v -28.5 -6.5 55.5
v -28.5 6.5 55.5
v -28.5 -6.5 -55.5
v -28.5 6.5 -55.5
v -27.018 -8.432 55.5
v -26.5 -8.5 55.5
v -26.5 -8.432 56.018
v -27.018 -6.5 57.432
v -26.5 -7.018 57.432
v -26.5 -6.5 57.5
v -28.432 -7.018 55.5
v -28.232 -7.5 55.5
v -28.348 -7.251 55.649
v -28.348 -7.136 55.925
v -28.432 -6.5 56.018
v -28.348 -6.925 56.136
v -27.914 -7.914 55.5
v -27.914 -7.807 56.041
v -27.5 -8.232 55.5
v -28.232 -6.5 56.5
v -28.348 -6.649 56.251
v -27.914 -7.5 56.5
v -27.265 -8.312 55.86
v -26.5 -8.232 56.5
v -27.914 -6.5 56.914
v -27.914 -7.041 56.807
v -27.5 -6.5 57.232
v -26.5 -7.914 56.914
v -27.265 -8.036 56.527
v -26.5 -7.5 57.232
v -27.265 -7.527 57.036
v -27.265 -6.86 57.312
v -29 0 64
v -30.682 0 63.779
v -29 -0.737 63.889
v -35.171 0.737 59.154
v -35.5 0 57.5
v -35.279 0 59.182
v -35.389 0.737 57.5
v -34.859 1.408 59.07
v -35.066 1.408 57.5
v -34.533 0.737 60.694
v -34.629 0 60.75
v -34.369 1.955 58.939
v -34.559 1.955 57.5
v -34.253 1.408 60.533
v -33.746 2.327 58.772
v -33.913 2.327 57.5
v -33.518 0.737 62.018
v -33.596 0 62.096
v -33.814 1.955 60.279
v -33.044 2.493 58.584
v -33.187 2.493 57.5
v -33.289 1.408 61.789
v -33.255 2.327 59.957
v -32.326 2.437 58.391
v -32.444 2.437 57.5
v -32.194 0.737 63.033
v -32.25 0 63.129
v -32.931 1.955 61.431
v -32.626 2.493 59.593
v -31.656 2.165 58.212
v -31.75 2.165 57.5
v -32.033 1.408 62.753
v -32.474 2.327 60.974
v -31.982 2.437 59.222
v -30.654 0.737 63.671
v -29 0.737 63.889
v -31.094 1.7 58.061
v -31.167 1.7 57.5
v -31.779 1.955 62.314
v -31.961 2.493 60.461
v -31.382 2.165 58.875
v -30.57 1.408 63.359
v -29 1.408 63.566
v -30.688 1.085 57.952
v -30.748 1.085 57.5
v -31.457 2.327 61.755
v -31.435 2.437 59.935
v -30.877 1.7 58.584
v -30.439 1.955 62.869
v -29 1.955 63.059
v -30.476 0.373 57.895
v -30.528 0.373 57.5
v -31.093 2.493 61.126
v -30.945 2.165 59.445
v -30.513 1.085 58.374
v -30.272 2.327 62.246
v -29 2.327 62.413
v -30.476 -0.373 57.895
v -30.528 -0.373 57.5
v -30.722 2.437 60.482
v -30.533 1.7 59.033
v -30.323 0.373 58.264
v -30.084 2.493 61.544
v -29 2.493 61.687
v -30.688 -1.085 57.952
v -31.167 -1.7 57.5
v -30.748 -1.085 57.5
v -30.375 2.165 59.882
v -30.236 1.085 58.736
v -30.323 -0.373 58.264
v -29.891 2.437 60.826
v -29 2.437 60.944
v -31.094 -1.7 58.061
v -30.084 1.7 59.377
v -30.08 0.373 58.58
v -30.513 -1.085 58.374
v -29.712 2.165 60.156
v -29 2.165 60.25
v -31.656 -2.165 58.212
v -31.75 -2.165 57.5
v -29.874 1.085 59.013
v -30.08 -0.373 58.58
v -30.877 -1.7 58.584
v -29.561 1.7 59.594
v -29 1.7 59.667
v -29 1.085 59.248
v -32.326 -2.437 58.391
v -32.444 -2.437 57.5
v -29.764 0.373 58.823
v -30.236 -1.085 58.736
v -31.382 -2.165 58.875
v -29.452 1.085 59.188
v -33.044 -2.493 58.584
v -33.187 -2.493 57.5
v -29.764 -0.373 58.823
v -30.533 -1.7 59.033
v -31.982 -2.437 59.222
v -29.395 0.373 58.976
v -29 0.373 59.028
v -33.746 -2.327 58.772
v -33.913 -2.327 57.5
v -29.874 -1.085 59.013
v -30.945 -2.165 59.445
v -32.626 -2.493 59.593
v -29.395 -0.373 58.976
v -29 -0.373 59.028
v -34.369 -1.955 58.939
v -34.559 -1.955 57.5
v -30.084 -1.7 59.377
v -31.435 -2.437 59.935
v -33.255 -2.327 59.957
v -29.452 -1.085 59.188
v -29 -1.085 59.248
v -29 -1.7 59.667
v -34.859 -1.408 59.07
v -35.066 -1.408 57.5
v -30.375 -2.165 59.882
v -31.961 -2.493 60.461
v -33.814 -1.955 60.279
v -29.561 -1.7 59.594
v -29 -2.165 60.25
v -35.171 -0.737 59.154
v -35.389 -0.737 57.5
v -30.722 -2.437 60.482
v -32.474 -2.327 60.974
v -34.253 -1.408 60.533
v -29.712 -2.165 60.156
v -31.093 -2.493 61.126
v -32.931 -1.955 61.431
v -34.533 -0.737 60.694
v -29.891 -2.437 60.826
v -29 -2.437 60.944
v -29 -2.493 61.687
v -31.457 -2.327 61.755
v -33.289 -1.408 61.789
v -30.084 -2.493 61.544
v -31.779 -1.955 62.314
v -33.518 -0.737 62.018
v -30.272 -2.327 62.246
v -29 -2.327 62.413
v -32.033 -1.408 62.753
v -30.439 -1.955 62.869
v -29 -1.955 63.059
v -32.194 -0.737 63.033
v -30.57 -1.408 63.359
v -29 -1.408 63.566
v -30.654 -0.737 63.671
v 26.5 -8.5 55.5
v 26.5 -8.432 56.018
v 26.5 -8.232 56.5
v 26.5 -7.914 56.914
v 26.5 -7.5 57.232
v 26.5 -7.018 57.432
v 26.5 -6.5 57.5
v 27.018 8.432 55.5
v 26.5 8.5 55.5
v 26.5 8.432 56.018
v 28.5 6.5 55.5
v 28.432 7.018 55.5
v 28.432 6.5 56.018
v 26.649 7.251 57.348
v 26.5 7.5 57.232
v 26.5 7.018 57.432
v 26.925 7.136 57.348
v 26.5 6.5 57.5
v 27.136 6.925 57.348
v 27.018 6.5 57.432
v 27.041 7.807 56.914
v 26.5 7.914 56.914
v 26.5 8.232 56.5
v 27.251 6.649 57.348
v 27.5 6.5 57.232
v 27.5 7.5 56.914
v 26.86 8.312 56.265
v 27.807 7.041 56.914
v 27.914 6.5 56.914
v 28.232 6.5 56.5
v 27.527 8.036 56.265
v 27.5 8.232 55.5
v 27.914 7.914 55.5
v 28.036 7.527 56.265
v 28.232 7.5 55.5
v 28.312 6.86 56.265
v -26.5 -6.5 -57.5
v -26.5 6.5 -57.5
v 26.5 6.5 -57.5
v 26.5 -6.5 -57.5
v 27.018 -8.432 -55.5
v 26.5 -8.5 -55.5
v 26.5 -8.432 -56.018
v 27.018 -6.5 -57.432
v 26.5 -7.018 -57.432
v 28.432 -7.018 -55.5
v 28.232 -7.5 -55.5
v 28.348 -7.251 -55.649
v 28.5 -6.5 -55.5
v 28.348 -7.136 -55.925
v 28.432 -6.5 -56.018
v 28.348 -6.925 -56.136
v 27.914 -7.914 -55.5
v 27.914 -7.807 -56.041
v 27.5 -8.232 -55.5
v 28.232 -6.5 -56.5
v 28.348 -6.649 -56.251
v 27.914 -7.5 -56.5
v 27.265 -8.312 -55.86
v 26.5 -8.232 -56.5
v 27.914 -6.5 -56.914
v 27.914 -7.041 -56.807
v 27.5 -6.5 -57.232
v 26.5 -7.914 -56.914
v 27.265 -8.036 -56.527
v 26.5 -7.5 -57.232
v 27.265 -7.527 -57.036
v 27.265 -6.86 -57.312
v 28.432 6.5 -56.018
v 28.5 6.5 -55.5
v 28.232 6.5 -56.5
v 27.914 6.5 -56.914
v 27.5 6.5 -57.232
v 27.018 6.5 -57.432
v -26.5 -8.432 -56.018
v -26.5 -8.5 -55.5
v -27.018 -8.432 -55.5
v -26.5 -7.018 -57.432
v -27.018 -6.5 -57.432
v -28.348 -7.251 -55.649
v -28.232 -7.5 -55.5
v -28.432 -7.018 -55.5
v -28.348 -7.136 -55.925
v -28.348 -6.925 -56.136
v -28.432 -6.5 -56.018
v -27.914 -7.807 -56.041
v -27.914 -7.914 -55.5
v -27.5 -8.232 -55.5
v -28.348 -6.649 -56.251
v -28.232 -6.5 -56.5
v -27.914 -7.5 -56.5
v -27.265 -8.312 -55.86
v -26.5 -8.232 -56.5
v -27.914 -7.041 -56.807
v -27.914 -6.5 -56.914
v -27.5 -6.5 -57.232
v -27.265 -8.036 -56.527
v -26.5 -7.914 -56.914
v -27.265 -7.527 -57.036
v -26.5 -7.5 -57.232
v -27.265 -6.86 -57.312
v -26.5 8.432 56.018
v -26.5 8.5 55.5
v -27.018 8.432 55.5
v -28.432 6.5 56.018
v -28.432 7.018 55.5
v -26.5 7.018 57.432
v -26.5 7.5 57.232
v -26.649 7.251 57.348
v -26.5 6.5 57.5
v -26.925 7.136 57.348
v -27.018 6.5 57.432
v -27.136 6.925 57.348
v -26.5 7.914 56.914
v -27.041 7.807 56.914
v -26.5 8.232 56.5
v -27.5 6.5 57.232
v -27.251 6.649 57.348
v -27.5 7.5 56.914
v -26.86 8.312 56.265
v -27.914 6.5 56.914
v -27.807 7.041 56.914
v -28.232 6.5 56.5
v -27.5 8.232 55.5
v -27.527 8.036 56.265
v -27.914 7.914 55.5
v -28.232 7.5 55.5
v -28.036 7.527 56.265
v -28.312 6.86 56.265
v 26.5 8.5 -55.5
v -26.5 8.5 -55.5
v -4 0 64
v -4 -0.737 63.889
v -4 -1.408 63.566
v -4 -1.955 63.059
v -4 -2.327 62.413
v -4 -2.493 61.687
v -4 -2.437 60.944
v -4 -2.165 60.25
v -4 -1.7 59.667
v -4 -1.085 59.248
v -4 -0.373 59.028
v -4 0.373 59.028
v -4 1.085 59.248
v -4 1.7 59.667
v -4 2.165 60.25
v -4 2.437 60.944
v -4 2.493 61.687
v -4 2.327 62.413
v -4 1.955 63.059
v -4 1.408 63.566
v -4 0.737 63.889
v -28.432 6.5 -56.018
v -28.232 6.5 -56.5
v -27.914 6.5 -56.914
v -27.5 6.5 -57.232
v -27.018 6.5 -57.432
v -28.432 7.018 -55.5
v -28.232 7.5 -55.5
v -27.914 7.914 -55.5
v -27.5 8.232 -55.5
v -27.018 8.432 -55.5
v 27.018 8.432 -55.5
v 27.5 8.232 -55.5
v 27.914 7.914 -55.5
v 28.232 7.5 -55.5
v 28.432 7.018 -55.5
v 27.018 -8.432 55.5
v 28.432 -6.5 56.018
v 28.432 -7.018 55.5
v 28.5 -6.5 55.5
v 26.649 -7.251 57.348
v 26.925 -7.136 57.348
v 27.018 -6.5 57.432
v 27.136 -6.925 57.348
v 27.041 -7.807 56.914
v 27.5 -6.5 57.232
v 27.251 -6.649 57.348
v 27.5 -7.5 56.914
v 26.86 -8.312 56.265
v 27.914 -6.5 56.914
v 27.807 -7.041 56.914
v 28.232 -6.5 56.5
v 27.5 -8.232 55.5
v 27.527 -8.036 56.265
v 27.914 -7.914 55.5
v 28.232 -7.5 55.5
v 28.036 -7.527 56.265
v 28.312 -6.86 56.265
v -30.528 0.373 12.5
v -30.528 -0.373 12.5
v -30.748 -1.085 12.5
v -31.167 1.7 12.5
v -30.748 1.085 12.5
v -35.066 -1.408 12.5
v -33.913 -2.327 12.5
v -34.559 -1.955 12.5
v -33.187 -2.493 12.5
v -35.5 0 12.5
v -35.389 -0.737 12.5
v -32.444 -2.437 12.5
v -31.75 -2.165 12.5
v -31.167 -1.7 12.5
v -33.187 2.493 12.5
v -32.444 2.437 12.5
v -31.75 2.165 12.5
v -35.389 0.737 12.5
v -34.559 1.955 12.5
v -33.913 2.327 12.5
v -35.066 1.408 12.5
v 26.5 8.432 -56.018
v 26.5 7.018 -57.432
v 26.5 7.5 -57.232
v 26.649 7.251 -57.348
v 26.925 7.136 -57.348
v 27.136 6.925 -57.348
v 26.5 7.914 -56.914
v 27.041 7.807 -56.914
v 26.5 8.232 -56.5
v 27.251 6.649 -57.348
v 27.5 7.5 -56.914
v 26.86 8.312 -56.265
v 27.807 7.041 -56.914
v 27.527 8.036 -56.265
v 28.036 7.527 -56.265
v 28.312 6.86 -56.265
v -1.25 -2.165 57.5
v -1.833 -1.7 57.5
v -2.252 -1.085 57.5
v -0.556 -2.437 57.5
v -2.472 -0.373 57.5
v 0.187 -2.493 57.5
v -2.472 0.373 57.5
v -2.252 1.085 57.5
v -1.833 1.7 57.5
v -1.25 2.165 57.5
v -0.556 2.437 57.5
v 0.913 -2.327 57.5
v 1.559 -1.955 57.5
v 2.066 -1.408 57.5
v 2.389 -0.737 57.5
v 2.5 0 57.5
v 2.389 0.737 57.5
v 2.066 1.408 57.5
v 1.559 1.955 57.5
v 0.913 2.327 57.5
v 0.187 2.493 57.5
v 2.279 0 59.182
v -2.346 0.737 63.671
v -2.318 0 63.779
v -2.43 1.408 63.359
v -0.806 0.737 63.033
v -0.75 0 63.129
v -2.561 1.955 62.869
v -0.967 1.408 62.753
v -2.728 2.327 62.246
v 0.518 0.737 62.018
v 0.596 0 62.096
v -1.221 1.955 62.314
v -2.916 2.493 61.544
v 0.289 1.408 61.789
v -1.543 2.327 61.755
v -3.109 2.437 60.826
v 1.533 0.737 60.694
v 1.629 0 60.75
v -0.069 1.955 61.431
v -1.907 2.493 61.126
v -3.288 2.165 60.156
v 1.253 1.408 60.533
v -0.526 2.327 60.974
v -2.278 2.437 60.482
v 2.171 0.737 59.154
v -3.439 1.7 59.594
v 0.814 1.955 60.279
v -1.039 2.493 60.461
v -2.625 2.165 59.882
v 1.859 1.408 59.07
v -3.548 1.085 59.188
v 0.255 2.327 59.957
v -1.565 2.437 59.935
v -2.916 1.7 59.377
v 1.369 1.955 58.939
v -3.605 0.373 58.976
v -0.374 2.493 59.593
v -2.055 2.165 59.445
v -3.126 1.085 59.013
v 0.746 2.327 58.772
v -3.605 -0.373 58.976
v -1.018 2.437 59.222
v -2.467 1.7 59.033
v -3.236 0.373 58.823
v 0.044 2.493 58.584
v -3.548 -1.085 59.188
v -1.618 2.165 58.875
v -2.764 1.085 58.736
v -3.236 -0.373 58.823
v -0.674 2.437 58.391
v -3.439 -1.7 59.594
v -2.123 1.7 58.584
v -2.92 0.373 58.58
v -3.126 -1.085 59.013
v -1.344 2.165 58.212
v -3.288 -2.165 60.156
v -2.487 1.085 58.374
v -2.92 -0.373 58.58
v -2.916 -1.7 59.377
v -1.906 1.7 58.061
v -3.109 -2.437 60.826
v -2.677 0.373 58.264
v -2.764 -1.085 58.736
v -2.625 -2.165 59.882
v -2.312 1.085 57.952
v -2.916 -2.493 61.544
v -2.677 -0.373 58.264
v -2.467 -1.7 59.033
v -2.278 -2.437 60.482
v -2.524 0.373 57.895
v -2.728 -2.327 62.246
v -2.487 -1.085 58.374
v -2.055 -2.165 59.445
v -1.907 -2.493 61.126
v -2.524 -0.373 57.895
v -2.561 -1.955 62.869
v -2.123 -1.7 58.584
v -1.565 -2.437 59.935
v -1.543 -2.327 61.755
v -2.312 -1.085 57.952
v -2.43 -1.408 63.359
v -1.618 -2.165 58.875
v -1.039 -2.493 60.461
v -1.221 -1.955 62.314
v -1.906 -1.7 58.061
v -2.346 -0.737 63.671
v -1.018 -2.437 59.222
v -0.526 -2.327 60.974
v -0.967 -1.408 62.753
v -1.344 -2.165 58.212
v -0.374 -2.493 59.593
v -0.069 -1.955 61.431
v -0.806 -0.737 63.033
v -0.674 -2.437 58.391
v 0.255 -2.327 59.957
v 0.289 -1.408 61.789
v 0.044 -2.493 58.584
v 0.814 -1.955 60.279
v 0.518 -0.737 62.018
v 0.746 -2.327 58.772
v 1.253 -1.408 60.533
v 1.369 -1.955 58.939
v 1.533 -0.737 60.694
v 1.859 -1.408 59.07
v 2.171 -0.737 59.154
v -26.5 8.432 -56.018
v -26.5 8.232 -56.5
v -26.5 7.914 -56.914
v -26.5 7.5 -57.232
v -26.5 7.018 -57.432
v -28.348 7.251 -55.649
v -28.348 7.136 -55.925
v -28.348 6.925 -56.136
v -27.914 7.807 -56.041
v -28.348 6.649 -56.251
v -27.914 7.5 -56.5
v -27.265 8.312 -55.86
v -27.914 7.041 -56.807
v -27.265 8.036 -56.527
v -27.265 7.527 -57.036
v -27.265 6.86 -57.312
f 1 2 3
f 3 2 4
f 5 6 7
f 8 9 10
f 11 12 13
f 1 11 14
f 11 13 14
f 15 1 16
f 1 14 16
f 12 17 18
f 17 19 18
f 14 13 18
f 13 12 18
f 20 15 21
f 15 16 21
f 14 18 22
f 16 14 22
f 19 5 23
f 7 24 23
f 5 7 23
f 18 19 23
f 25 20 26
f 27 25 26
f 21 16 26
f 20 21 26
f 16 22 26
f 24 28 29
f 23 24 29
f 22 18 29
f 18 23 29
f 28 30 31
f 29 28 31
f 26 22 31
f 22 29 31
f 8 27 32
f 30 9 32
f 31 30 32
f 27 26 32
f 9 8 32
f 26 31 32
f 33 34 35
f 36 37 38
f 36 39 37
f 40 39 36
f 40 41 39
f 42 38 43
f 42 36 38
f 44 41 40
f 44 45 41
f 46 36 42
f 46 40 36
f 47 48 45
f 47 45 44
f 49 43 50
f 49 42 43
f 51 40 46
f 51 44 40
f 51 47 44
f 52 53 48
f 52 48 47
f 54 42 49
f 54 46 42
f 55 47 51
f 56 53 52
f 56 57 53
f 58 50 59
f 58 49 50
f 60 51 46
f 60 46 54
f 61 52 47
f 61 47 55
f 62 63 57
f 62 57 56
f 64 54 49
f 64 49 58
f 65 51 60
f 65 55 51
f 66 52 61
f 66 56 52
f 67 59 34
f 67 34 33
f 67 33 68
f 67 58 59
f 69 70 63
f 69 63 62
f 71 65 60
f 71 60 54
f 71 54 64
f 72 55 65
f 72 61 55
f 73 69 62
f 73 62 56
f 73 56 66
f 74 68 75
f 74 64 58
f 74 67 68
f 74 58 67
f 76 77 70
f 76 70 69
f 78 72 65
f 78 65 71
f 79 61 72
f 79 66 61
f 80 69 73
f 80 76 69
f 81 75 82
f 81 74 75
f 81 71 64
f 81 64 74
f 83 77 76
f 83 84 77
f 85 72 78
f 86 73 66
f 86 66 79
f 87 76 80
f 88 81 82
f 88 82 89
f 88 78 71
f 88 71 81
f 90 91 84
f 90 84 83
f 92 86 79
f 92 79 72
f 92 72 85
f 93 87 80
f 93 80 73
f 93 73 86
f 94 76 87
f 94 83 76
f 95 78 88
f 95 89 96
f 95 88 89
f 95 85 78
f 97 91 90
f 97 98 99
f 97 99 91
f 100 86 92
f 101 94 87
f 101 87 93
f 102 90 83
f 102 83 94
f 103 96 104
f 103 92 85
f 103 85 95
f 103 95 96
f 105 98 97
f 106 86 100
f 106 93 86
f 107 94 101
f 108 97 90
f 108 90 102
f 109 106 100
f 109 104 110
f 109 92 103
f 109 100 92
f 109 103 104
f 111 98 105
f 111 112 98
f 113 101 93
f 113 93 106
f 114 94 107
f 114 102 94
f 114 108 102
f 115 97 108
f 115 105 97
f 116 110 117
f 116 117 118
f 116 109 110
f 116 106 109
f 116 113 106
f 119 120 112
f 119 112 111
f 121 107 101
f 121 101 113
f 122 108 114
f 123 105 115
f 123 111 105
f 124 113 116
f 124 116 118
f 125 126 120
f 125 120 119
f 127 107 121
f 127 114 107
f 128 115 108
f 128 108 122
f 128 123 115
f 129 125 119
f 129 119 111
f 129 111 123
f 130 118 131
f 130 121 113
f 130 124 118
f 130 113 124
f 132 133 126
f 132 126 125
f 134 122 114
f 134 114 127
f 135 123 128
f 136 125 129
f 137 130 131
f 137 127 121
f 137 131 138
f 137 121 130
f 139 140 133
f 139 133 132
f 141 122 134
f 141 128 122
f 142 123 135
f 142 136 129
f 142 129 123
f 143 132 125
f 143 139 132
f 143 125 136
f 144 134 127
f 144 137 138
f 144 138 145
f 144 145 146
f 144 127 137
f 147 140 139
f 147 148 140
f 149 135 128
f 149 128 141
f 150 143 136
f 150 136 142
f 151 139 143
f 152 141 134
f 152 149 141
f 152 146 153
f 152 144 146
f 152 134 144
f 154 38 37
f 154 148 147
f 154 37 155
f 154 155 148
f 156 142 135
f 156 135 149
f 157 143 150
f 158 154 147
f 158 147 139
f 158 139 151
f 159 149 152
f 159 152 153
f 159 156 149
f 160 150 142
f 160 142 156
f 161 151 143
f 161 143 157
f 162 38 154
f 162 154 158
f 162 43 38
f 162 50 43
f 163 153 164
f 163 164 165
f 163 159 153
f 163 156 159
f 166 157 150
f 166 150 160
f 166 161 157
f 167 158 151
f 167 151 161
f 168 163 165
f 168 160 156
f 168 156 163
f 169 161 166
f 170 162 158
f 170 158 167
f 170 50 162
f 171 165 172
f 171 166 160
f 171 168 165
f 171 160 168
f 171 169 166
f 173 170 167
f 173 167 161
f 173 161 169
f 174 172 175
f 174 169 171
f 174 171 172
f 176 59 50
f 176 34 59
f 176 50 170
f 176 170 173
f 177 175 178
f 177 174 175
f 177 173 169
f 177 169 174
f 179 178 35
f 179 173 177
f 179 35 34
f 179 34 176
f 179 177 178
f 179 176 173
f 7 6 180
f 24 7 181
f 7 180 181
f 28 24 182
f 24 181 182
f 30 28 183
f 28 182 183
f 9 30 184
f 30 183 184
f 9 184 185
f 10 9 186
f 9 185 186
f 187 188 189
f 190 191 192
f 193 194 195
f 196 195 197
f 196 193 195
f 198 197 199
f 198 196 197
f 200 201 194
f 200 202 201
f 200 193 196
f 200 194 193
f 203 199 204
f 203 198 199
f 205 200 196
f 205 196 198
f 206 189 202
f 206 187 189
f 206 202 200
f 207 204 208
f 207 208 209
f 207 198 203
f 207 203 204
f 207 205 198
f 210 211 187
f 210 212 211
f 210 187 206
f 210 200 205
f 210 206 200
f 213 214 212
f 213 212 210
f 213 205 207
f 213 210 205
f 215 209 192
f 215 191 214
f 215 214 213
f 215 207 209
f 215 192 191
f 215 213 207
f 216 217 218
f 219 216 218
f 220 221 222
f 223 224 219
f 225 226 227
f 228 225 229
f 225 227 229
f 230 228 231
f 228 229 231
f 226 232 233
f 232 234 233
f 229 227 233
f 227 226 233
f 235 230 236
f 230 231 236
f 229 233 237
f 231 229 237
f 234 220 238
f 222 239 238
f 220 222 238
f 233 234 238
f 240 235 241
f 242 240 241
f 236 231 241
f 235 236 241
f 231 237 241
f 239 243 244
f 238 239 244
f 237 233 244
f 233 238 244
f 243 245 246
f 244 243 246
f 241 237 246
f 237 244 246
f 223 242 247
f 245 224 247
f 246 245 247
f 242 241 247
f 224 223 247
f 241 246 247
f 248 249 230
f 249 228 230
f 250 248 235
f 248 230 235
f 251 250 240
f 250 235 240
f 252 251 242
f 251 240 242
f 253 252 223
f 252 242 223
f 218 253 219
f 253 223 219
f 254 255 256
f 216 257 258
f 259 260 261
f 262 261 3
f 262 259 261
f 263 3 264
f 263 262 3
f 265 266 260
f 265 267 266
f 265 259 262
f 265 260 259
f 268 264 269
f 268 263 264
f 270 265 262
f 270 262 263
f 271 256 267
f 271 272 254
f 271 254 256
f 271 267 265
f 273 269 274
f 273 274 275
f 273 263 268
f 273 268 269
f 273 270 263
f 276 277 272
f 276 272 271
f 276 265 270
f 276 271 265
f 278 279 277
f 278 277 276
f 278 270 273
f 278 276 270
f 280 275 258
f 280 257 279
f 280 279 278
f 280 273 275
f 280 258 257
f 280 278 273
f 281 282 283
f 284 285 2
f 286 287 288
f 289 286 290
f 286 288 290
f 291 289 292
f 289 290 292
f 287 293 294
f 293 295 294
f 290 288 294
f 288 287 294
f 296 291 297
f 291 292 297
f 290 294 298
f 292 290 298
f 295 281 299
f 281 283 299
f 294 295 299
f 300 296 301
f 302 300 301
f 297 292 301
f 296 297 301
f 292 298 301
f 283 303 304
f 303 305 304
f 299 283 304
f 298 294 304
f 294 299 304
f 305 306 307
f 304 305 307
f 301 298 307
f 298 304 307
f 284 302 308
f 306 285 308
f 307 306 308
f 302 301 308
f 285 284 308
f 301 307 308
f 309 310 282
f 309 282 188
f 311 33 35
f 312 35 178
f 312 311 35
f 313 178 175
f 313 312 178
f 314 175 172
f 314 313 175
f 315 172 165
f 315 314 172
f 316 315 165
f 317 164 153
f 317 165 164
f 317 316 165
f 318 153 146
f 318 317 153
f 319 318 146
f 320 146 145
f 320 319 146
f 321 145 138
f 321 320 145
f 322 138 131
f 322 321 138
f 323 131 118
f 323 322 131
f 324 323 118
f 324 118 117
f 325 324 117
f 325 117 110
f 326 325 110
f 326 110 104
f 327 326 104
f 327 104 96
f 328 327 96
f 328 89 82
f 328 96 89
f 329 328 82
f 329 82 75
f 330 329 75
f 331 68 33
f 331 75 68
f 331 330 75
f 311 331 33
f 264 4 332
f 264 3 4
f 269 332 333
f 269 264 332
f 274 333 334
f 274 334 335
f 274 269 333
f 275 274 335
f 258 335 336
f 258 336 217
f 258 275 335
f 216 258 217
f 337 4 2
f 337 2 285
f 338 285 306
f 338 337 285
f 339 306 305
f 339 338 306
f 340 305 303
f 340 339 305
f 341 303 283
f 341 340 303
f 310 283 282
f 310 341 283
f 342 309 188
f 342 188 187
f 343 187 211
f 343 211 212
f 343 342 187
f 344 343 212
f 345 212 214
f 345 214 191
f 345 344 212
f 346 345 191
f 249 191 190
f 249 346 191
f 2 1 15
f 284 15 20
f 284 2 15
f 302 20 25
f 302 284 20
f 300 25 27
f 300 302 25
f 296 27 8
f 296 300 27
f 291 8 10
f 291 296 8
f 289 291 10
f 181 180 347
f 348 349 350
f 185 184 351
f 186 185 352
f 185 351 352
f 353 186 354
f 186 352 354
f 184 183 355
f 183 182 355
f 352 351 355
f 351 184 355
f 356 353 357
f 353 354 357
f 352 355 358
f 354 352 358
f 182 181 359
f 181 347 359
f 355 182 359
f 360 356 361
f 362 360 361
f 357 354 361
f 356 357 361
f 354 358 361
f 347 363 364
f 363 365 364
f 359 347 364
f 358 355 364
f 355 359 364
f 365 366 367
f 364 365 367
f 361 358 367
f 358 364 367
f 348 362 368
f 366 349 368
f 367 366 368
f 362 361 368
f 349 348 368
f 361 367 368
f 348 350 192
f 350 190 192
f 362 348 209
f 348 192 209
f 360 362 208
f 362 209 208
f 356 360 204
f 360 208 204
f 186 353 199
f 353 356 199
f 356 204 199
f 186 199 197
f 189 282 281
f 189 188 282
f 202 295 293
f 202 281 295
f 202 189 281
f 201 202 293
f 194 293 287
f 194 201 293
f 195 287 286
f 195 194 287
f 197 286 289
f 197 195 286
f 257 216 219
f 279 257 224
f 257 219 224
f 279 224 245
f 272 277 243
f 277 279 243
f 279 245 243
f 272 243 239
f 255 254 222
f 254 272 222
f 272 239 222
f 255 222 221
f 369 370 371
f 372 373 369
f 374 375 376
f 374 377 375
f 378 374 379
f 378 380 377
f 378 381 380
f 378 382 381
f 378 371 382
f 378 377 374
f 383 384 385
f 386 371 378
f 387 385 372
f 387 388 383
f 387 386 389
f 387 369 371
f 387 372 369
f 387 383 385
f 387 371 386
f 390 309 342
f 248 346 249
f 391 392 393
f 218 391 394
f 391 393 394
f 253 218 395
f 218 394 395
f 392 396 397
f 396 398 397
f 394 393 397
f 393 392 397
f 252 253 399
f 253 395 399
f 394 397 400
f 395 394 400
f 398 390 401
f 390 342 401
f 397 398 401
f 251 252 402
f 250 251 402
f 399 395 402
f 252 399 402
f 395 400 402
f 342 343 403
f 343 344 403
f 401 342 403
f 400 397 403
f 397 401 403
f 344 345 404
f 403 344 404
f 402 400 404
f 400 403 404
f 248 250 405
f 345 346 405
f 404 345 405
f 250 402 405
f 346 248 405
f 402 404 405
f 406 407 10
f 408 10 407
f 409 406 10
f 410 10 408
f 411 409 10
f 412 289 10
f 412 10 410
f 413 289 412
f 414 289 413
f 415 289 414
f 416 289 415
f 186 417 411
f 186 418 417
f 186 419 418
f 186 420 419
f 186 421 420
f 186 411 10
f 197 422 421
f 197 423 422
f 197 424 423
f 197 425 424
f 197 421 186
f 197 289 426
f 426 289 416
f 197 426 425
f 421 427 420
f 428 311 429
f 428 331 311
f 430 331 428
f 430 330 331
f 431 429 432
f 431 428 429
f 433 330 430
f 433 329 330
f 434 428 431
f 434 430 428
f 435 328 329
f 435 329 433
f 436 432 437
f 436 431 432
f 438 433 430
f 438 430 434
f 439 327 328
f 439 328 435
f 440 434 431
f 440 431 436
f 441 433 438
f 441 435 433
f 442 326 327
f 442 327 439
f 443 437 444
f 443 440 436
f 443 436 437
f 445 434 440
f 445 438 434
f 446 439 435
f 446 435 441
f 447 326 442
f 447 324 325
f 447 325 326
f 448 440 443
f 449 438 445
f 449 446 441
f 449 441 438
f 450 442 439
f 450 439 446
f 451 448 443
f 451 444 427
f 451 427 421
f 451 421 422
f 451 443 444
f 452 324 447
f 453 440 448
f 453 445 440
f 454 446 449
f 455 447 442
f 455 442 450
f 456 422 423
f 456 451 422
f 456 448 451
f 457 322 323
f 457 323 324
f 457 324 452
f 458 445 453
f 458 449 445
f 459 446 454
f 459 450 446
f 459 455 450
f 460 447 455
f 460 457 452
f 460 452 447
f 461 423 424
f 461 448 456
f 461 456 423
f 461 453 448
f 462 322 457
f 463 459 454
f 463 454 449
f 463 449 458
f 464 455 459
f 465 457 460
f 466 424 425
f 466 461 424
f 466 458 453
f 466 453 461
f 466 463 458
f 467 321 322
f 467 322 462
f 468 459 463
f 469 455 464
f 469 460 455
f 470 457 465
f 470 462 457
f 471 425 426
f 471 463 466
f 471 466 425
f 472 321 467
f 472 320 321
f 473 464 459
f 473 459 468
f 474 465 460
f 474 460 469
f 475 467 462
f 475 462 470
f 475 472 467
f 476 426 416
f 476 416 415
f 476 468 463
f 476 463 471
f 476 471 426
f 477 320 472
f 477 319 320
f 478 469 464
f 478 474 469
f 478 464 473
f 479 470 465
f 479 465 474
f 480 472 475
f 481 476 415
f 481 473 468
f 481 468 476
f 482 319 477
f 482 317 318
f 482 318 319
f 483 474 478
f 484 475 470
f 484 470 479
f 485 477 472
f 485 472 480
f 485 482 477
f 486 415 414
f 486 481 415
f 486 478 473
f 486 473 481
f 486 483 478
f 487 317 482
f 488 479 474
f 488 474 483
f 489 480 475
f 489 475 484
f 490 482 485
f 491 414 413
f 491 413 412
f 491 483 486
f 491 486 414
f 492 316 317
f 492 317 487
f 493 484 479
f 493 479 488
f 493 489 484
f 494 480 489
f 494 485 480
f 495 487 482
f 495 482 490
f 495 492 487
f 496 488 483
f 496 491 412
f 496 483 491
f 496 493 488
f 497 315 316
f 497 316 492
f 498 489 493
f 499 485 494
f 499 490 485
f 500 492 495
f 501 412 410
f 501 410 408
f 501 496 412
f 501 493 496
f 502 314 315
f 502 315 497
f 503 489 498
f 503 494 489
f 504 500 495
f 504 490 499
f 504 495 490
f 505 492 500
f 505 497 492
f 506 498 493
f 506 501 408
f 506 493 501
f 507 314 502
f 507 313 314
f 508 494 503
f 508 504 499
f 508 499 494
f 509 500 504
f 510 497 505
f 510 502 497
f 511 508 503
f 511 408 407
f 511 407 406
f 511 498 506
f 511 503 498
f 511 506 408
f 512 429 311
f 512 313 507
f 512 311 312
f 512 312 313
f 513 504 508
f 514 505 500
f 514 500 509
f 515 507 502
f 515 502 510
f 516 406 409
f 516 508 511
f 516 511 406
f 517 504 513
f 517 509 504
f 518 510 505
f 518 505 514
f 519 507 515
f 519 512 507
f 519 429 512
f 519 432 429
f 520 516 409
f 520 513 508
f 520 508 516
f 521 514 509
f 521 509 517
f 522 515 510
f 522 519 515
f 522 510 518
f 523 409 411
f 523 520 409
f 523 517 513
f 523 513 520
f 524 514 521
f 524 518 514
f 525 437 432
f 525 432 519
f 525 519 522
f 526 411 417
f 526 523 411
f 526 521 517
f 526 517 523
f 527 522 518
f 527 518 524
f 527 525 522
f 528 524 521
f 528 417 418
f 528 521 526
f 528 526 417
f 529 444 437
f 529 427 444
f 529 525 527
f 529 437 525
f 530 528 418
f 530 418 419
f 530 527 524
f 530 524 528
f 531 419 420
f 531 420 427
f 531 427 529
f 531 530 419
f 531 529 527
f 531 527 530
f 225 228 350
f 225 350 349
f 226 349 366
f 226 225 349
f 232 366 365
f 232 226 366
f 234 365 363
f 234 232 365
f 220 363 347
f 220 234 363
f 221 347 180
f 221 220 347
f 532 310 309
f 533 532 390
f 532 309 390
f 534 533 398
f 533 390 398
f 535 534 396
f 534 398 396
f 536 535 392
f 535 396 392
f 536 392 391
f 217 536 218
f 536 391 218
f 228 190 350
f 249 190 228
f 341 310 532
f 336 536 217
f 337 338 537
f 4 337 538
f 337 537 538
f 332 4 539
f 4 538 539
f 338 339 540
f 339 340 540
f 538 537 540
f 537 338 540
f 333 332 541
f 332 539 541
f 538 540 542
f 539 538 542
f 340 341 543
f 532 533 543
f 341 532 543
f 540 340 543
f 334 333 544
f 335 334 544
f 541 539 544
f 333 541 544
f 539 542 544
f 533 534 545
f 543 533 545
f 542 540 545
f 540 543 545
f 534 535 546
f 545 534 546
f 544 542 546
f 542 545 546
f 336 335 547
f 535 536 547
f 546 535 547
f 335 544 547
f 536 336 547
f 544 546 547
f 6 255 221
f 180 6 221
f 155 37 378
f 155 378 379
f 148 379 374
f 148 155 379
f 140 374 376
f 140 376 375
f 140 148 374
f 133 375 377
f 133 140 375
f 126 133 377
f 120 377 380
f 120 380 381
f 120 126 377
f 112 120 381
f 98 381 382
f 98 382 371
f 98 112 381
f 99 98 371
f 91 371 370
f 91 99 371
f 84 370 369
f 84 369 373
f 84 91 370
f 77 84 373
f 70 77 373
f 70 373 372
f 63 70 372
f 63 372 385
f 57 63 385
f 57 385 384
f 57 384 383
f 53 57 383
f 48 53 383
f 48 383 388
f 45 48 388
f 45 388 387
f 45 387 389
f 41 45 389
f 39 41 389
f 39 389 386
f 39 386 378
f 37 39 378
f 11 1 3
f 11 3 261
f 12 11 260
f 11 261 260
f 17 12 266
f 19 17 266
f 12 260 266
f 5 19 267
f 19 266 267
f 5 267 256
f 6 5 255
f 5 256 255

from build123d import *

# Parameters (mm, degrees)
SKETCH_1_W      = 57
SKETCH_1_H      = 115
EXTRUDE_1_DEPTH = 8.5
FILLET_1_R      = 2
SKETCH_3_R      = 2.5


with BuildPart() as part:
    # 草图1 → 凸台-拉伸1 (new body, symmetric)
    with BuildSketch(Plane(origin=(0, 0, 0), x_dir=(1, 0, 0), z_dir=(0, 1, 0))):
        Rectangle(SKETCH_1_W, SKETCH_1_H)
    extrude(amount=EXTRUDE_1_DEPTH, both=True)

    # 圆角1
    fillet_1_edges = [part.edges().sort_by_distance(p)[0] for p in [
        (28.5, 8.5, 0),
        (0, 8.5, -57.5),
        (-28.5, 8.5, 0),
        (0, -8.5, -57.5),
        (28.5, -8.5, 0),
        (0, -8.5, 57.5),
        (-28.5, -8.5, 0),
        (0, 8.5, 57.5),
        (-28.5, 0, -57.5),
        (28.5, 0, -57.5),
        (28.5, 0, 57.5),
        (-28.5, 0, 57.5),
    ]]
    fillet(fillet_1_edges, radius=FILLET_1_R)

    # 扫描1: sweep along a path in 草图2
    with BuildLine(Plane(origin=(0, 0, 0), x_dir=(1, 0, 0), z_dir=(0, 1, 0))) as sweep_1_path:
        Line((-33, -12.5), (-33, -57.5))
        ThreePointArc((-33, -57.5), (-31.828427125, -60.328427125), (-29, -61.5))
        Line((-29, -61.5), (-4, -61.5))
        ThreePointArc((-4, -61.5), (-1.171572875, -60.328427125), (0, -57.5))
    # 草图3 → 扫描1 (sweep)
    with BuildSketch(Plane.XY.offset(57.5)):
        Circle(SKETCH_3_R)
    sweep(path=sweep_1_path.line)


solid = part.part
